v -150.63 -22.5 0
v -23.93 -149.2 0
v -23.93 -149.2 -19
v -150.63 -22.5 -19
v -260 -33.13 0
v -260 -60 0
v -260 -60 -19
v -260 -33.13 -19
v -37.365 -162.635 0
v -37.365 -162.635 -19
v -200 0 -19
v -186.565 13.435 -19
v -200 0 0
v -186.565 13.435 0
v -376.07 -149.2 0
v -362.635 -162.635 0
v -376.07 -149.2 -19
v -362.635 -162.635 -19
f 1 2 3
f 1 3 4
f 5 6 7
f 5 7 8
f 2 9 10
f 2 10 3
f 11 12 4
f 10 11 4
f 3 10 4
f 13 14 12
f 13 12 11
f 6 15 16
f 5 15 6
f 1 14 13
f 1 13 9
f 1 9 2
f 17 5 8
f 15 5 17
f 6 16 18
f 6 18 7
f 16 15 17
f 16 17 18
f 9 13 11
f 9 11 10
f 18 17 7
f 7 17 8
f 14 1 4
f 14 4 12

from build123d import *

# Parameters (mm, degrees)
F1_DEPTH = 19


with BuildPart() as f1:
    # F0 (on Top) → F1 (new body)
    with BuildSketch(Plane.XY):
        Polygon((-260, -33.1299423149), (-376.0695885154, -149.1995308304), (-362.6345596729, -162.6345596729), (-260, -60), align=None)
    extrude(amount=-F1_DEPTH)


with BuildPart() as f1b:
    # F0 (on Top) → F1, piece 2 (new body)
    with BuildSketch(Plane.XY):
        Polygon((-186.5649711575, 13.4350288425), (-200, 0), (-177.5, -22.5), (-150.6299423149, -22.5), align=None)
        Polygon((-150.6299423149, -22.5), (-177.5, -22.5), (-140, -60), (-140, -33.1299423149), align=None)
        Polygon((-140, -33.1299423149), (-140, -60), (-37.3654403271, -162.6345596729), (-23.9304114845, -149.1995308304), align=None)
    extrude(amount=-F1_DEPTH)


solid = Compound([f1.part, f1b.part])
